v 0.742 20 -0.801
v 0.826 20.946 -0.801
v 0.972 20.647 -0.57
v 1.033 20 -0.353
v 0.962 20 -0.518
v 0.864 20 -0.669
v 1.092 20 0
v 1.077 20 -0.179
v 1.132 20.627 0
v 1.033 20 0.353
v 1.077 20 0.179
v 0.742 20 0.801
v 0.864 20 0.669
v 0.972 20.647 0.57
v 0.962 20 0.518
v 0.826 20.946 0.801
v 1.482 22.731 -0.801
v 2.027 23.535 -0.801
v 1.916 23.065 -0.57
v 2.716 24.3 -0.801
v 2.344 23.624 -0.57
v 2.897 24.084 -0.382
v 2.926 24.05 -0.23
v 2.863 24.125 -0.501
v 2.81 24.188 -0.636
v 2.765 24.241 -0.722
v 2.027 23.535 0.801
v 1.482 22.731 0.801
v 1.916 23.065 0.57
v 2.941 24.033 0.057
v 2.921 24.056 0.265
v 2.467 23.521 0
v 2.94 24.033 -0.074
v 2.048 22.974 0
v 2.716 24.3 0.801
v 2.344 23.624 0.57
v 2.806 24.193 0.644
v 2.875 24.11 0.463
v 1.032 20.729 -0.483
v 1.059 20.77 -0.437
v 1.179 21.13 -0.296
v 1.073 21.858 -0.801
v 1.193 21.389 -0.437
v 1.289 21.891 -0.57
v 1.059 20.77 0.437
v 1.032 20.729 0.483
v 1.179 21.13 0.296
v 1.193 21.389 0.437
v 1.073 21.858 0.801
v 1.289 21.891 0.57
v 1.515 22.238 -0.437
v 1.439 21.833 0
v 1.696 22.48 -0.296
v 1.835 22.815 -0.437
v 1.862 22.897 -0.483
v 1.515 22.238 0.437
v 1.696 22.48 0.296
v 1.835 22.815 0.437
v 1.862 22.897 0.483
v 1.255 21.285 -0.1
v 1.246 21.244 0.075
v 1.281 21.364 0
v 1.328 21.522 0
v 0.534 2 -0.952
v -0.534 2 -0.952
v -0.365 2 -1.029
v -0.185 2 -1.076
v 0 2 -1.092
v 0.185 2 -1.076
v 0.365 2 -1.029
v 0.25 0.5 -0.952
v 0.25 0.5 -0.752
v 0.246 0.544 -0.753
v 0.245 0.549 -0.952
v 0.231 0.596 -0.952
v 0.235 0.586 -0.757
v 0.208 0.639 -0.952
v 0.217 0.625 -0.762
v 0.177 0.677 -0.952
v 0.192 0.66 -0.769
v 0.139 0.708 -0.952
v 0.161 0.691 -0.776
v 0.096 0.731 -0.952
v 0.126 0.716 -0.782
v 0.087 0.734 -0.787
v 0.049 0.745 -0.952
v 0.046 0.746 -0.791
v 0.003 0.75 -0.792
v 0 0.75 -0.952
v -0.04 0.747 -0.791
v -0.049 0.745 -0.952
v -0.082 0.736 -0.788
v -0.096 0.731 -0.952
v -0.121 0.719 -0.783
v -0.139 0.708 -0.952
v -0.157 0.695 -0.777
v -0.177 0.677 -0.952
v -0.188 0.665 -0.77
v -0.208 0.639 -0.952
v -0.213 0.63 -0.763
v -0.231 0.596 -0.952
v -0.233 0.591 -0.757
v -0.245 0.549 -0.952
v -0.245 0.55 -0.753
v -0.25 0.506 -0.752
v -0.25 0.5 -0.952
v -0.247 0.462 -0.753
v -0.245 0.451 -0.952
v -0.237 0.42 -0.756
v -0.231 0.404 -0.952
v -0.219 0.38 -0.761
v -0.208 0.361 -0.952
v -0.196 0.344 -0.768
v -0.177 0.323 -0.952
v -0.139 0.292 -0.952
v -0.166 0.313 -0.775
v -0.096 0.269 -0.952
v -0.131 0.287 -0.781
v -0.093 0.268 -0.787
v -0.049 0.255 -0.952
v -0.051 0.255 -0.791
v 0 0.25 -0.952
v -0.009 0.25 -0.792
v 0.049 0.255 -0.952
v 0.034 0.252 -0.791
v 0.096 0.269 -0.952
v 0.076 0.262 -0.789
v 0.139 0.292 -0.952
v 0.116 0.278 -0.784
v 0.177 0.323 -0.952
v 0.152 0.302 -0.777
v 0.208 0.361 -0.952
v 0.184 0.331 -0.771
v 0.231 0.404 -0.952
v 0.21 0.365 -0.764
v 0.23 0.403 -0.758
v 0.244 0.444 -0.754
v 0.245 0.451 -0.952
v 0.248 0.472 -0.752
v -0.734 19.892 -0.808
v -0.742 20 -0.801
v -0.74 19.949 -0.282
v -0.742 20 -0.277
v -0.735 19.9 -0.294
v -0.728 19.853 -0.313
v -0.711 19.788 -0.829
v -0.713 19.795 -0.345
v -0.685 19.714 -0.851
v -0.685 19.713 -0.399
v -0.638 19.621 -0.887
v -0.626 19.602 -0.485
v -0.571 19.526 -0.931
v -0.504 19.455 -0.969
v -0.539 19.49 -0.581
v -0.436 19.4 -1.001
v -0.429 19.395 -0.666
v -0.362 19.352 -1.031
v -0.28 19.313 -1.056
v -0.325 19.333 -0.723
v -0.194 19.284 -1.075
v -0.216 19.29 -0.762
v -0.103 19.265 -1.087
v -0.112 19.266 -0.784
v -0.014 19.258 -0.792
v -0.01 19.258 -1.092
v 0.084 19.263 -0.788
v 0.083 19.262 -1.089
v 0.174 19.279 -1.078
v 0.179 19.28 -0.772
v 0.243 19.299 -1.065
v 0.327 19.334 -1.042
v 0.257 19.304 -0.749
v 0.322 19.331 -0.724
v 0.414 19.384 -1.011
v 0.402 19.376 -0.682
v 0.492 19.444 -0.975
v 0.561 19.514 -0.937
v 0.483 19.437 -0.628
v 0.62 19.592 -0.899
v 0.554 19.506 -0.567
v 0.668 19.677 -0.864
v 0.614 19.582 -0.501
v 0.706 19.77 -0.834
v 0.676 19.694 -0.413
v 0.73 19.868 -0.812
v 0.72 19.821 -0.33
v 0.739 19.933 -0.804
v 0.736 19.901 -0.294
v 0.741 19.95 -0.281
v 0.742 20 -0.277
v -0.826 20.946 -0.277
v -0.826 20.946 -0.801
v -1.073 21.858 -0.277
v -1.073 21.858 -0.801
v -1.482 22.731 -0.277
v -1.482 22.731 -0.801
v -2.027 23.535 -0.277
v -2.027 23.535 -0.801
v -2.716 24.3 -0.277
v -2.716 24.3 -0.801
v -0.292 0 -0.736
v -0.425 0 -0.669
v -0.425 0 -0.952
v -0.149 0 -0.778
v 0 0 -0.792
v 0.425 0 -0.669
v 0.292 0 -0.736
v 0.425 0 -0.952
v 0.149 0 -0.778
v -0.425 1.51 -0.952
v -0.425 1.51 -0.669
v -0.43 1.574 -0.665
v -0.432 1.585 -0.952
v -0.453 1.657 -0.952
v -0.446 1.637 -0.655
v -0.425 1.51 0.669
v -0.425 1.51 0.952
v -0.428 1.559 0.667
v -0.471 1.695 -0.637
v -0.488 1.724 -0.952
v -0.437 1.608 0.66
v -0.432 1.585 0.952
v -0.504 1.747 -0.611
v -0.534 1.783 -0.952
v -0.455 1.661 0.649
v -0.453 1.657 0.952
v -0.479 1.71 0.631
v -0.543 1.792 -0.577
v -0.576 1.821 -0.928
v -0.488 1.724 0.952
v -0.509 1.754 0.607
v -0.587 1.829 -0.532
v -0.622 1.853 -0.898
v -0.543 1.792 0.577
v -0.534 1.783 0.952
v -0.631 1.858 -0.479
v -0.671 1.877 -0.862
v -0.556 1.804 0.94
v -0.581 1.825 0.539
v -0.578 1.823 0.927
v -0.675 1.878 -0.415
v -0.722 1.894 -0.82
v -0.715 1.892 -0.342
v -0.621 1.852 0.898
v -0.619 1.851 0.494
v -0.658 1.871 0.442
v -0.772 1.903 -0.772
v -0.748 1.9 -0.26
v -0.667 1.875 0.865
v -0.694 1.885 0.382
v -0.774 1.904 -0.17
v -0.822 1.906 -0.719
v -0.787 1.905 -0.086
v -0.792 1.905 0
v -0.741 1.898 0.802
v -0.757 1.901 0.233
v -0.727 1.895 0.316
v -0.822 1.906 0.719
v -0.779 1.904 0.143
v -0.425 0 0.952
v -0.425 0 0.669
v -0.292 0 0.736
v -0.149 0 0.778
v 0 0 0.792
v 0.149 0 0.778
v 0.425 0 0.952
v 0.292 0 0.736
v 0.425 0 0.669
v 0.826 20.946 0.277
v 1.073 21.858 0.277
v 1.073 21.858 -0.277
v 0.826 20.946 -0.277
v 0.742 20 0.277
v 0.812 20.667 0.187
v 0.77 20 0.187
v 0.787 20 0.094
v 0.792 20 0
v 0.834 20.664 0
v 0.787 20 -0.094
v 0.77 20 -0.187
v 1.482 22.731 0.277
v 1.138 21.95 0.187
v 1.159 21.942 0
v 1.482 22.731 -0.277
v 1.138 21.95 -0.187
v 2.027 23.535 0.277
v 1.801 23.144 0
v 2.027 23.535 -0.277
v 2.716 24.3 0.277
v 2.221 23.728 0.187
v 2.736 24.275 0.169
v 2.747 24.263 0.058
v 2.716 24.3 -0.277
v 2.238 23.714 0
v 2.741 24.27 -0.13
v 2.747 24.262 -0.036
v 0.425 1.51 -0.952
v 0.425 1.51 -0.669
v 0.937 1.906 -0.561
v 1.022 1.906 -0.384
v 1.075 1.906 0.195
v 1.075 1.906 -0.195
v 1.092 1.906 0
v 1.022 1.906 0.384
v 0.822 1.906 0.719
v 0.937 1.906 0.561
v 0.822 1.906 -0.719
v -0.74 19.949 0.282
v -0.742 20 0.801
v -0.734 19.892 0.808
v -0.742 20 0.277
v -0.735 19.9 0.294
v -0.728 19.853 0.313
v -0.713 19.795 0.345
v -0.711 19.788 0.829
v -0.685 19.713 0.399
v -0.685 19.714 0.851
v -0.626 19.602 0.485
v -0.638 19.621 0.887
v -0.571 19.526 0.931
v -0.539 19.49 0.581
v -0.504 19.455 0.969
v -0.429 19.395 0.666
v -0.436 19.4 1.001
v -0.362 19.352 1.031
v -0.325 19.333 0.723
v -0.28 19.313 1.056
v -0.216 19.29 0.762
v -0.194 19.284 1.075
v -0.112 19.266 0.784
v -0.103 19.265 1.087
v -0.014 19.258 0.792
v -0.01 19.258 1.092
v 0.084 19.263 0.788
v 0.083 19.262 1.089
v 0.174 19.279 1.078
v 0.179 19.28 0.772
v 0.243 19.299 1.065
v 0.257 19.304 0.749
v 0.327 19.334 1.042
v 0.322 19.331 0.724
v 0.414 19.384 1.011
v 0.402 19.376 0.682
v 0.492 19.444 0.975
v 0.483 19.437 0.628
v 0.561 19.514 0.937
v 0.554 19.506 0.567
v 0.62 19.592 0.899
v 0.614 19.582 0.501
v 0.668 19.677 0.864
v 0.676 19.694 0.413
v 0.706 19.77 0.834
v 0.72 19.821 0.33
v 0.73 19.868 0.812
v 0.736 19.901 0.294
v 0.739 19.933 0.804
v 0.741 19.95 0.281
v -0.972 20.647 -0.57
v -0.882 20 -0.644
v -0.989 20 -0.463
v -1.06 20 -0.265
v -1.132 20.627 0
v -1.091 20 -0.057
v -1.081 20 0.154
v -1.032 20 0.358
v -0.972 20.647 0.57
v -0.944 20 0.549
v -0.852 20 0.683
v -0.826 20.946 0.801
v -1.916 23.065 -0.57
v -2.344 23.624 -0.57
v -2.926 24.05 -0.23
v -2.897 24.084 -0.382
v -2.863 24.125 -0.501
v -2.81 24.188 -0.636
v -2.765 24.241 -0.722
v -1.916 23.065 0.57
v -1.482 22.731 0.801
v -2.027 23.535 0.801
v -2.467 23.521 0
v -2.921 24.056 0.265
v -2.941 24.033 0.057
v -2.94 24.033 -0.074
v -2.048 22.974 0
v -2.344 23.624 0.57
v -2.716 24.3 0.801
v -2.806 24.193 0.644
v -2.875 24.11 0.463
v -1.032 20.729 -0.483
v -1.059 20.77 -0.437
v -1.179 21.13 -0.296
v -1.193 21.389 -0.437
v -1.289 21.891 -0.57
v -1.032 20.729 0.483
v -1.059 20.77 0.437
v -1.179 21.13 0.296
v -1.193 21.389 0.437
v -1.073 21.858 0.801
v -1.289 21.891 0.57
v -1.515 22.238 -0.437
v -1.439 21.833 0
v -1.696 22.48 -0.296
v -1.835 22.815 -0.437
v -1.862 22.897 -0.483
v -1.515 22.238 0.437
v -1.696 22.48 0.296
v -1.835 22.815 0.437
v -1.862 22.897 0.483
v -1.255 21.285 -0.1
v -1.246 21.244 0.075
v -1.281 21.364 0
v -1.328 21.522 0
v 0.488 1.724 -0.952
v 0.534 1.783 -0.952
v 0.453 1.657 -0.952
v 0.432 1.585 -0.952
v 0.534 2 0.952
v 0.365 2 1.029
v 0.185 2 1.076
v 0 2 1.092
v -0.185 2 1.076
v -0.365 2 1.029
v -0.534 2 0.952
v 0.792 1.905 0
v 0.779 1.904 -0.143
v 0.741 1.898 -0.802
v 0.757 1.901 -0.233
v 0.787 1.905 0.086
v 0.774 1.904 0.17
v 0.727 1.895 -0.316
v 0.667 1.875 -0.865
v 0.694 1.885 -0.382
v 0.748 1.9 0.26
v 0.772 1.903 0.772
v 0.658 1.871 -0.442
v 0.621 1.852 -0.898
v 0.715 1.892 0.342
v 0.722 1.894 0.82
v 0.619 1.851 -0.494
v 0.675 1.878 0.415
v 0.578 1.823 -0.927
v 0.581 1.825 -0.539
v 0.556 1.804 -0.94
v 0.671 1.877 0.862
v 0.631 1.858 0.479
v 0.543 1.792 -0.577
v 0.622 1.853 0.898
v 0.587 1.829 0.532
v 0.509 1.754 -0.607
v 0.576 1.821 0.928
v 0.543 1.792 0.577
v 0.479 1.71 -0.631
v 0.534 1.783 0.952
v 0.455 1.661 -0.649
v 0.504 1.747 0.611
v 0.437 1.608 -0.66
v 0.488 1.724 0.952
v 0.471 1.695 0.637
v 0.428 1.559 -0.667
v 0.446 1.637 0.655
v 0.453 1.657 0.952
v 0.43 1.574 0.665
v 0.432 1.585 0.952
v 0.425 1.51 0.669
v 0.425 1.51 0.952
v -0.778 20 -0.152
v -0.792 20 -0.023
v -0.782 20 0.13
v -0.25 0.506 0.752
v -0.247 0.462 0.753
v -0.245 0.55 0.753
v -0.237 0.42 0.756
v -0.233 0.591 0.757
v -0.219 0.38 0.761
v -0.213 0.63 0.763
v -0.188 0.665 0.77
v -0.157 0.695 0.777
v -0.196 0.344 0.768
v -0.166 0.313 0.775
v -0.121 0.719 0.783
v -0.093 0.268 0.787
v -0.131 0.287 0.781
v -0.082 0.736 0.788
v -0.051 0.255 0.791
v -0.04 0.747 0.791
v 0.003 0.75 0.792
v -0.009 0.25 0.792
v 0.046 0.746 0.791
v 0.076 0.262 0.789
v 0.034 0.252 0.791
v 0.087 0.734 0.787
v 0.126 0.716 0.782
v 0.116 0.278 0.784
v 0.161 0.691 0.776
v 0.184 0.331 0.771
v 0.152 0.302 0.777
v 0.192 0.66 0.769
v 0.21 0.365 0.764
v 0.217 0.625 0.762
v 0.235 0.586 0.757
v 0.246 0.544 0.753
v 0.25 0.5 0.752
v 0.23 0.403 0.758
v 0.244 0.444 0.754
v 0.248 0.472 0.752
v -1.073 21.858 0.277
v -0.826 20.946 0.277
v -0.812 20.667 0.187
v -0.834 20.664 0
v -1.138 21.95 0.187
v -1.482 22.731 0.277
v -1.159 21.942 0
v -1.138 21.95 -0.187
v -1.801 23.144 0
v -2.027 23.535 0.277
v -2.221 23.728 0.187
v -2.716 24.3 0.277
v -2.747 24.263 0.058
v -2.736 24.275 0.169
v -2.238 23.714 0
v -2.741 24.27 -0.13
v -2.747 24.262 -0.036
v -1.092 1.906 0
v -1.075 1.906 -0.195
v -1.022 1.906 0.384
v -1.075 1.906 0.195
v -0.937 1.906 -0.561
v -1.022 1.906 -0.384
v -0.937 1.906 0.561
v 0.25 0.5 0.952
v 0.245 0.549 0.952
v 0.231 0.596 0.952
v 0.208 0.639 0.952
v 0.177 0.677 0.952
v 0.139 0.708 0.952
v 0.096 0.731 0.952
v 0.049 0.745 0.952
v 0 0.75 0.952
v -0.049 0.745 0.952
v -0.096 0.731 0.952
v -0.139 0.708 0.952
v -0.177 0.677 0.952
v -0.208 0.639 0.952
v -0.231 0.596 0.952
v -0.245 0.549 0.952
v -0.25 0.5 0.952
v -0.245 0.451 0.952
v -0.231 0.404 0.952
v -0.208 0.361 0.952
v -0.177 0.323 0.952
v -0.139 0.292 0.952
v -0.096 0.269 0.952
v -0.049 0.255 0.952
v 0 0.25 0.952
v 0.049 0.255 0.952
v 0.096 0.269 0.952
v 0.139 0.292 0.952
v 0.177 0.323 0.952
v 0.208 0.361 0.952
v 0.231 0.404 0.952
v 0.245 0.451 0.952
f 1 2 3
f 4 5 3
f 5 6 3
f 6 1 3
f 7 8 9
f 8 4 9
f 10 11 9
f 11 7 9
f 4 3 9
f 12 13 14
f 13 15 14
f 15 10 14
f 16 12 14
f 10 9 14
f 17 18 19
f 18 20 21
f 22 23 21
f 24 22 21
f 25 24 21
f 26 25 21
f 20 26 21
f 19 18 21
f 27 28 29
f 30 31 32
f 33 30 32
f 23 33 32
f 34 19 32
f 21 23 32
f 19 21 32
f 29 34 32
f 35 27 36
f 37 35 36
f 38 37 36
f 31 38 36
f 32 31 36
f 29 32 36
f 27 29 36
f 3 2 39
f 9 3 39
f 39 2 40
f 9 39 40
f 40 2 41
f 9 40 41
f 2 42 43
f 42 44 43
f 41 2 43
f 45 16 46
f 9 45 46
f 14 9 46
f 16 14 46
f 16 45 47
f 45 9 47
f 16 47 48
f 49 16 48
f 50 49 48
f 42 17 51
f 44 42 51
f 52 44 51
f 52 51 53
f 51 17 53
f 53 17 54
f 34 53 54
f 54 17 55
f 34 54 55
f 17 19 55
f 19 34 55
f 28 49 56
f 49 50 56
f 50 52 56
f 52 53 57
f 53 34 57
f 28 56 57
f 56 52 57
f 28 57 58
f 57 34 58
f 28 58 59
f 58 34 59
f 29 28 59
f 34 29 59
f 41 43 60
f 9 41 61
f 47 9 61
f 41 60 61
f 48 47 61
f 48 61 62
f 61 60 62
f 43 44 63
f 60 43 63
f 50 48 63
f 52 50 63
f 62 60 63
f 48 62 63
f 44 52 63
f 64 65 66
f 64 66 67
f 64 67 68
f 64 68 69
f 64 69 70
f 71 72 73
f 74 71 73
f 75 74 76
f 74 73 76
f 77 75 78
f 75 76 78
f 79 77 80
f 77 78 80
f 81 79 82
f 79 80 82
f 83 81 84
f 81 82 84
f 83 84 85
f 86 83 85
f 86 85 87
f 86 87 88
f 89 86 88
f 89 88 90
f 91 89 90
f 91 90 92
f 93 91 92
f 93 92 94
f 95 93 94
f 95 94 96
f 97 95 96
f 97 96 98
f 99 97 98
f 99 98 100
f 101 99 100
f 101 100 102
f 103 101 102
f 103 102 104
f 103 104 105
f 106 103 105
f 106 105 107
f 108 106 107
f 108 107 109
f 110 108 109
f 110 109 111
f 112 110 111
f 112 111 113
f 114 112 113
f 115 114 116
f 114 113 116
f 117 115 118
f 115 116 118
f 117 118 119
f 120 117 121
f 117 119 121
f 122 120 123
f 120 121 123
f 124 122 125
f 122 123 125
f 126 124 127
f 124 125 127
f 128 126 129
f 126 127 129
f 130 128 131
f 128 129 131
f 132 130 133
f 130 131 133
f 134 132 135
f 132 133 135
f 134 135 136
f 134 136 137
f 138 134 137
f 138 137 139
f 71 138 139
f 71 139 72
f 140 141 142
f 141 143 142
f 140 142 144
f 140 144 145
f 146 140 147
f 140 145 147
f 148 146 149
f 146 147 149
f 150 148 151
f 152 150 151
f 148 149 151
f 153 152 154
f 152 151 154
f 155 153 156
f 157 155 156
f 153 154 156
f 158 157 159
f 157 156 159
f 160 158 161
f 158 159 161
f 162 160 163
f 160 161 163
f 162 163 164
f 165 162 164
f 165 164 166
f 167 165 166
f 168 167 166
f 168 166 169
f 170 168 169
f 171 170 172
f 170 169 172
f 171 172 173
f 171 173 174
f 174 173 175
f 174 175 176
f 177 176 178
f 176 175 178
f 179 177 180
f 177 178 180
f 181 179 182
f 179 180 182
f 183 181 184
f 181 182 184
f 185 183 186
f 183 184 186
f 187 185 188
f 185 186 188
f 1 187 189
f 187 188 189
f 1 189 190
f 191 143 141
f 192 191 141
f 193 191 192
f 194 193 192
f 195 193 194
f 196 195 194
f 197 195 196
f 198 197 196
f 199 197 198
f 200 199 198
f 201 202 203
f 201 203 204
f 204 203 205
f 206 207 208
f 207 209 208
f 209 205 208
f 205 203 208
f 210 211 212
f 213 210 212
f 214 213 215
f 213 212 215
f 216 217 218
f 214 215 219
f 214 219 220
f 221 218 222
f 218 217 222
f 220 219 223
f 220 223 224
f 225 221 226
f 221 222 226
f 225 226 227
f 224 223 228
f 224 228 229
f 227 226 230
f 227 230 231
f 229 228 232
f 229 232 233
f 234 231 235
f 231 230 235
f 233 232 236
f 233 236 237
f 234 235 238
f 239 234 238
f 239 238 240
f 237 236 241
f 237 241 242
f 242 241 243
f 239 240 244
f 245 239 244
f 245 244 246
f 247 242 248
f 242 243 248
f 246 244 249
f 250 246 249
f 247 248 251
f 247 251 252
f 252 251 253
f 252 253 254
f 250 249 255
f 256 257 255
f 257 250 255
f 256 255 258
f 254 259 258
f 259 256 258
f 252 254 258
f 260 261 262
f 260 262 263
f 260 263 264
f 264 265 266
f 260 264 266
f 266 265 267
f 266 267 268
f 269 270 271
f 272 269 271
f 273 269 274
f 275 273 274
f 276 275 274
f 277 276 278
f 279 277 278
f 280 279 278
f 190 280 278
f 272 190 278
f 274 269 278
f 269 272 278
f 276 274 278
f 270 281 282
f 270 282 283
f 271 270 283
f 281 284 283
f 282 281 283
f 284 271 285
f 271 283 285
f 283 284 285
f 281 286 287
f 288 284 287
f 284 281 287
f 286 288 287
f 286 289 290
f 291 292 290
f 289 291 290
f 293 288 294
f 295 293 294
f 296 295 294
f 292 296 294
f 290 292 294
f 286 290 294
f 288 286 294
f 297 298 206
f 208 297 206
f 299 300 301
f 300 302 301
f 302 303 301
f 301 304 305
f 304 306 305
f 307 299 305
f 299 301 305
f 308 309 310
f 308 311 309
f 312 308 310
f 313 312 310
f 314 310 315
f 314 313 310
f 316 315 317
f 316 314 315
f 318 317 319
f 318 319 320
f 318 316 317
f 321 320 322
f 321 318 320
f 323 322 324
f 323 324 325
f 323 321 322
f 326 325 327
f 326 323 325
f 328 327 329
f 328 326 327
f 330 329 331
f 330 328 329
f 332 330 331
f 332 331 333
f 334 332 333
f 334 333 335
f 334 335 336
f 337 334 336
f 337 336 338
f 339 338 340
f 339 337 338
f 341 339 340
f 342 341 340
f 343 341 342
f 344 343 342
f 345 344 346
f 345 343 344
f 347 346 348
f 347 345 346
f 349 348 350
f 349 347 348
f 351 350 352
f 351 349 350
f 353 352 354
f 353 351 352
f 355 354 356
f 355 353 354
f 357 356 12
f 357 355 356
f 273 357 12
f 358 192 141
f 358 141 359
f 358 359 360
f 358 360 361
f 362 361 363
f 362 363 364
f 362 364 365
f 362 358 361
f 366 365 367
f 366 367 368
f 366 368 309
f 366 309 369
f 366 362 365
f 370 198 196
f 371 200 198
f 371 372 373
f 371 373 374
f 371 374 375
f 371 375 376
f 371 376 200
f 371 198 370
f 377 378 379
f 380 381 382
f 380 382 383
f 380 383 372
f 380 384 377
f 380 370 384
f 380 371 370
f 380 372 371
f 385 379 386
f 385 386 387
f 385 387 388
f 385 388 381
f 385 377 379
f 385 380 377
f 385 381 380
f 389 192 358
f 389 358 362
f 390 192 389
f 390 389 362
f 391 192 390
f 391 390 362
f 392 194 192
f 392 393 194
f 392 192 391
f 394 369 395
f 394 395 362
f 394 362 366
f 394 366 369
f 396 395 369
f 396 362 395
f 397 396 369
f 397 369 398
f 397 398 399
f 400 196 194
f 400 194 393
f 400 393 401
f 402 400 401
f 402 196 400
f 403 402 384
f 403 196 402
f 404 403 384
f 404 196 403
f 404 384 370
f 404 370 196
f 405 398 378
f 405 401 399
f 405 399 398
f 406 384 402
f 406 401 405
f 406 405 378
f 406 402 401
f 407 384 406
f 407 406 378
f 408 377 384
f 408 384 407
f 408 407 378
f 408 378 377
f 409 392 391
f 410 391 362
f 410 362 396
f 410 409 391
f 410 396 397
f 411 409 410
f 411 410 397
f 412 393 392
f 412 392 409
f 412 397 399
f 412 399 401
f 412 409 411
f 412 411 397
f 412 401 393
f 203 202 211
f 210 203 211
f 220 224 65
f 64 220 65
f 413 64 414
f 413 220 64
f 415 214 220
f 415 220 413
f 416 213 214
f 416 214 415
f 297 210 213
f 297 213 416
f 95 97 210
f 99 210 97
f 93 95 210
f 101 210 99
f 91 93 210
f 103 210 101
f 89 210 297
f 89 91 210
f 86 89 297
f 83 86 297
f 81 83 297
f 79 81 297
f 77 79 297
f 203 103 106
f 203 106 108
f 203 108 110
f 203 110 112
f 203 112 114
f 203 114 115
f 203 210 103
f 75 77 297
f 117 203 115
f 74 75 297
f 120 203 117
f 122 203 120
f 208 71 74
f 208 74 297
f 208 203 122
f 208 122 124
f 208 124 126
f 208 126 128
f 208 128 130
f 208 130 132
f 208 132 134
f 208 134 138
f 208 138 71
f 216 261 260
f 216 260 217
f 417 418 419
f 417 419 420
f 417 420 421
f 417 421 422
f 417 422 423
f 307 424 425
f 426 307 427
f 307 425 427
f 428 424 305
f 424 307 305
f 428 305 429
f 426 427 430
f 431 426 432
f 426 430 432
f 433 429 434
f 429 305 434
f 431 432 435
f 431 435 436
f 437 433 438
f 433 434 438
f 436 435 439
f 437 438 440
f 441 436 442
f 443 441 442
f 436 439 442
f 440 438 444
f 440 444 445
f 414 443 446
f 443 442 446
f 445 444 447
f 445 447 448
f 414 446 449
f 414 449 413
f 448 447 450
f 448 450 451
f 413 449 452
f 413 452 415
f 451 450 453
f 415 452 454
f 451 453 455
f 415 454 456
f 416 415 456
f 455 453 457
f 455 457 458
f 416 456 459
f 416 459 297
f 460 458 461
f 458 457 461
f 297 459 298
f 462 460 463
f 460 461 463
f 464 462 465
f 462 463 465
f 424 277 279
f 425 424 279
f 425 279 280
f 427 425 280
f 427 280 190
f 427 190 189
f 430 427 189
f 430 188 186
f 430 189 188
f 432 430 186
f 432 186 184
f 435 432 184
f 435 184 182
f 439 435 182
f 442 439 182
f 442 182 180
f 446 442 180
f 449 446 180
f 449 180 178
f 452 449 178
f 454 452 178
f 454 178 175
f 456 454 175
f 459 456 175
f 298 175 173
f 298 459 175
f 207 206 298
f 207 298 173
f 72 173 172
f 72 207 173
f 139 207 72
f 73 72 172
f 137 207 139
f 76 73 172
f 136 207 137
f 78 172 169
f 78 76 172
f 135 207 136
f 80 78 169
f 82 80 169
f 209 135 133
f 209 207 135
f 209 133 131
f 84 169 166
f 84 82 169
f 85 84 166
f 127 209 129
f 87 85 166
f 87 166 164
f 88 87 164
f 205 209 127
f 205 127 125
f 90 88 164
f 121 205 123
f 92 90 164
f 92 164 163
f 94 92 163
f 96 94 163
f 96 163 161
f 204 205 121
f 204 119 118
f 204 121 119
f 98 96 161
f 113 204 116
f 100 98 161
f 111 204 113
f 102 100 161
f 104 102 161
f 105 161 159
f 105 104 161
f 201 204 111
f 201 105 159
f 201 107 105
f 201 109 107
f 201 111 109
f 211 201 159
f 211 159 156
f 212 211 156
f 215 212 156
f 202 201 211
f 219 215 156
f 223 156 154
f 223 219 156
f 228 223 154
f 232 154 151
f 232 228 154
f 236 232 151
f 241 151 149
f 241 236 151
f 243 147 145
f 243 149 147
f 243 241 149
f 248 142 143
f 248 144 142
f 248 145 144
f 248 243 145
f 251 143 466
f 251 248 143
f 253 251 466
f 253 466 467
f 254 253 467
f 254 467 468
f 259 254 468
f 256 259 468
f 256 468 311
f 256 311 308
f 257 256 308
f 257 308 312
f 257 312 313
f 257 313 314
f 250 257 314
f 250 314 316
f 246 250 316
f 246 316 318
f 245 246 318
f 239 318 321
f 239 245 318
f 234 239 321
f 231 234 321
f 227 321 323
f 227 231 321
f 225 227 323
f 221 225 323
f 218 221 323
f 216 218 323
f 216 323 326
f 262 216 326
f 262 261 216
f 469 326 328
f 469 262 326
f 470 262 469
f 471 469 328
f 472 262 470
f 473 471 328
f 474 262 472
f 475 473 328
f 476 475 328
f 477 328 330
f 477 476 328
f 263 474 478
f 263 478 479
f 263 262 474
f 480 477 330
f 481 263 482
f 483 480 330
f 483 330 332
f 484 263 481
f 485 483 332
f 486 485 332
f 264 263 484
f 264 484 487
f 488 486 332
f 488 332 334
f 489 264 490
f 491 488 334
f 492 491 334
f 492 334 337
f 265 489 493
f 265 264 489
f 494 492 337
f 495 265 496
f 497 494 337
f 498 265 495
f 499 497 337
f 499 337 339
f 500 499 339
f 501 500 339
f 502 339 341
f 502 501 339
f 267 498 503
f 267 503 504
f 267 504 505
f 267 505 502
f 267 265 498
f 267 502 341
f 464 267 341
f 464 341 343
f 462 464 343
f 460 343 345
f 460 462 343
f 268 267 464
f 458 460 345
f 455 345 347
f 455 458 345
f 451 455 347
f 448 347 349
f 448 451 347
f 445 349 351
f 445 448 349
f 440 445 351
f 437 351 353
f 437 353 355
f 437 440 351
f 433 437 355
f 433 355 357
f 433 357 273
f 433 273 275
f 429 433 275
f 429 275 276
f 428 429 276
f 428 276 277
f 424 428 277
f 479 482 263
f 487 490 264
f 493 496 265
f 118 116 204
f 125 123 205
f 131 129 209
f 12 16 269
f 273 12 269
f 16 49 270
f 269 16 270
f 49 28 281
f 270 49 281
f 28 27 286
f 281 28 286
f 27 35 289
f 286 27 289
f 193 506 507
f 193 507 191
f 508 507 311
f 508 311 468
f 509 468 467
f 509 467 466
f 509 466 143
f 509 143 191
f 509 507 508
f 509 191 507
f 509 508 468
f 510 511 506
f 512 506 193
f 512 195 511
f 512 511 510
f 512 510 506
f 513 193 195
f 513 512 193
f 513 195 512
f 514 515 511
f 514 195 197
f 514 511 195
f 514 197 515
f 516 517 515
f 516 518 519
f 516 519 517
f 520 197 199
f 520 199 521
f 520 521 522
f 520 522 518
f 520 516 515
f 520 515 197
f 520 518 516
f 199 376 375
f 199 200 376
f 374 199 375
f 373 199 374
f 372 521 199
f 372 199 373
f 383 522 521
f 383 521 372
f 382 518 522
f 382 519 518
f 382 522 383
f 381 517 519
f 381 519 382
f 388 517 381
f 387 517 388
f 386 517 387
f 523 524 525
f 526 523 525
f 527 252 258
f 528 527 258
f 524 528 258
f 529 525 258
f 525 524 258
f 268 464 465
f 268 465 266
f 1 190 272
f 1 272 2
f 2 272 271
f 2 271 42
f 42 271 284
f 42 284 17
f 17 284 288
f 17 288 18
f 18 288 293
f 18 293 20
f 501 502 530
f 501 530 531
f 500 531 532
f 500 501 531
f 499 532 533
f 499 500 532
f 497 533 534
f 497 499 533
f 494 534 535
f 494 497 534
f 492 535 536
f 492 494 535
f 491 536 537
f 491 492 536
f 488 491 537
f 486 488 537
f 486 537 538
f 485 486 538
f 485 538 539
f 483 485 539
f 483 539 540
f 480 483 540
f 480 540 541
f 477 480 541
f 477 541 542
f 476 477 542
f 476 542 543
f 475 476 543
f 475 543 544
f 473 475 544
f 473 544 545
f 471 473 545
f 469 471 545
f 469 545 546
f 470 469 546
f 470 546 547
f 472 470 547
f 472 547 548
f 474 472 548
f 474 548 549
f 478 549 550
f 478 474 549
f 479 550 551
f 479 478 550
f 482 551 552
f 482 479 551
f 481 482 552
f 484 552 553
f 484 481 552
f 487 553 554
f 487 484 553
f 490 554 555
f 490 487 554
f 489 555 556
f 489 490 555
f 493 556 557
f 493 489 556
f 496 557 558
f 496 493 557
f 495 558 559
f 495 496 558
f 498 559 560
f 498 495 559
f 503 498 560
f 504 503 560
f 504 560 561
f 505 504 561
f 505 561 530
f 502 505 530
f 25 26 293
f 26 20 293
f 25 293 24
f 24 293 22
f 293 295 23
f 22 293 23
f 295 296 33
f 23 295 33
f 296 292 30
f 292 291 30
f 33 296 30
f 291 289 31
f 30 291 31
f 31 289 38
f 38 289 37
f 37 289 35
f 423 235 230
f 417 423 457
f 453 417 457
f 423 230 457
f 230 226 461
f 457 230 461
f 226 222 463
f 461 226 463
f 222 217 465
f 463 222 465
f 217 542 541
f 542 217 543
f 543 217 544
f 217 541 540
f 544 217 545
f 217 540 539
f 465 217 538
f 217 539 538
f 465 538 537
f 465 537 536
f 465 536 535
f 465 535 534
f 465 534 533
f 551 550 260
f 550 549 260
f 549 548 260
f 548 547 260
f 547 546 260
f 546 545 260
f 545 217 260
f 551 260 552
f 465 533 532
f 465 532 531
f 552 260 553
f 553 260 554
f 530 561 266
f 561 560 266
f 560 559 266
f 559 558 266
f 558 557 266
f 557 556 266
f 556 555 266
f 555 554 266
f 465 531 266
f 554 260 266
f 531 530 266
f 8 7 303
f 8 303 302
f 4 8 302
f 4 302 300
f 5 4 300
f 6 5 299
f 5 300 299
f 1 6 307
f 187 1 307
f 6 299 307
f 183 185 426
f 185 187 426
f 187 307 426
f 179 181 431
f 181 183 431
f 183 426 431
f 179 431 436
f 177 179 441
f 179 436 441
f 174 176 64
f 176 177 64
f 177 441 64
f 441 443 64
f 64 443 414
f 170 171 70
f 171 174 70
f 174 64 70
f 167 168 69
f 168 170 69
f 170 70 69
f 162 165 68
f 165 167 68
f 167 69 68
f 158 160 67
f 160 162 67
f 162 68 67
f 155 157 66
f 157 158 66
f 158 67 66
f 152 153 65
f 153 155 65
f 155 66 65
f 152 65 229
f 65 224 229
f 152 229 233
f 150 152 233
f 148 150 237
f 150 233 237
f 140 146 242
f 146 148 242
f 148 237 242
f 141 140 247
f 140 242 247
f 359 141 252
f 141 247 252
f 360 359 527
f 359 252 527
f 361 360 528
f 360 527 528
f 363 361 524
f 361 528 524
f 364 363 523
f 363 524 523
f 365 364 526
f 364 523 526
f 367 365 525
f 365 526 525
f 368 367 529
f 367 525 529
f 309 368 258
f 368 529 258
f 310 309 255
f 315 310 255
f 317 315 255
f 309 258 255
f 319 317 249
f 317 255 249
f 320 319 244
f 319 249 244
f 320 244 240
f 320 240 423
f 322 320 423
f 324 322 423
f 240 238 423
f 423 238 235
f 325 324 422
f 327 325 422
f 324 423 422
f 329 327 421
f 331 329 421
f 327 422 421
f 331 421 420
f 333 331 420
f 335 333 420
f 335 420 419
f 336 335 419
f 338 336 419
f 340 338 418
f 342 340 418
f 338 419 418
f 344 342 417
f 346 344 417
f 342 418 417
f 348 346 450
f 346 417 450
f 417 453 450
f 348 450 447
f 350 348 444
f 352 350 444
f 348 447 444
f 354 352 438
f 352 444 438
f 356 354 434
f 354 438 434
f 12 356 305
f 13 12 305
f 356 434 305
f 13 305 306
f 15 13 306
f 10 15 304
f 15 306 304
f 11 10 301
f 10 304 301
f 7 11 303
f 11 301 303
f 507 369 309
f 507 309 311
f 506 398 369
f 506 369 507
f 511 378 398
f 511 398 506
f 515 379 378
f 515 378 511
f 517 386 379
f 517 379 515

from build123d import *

# Parameters (mm, degrees)
SKETCH1_R                = 1.0922
SKETCH1_R_2              = 0.7922
EXTRUDE_THIN1_DEPTH      = 20
CUT_EXTRUDE1_DEPTH       = 26.634625129
CUT_EXTRUDE1_DEPTH_BACK  = 26.634625129
SKETCH5_R                = 0.7422
CUT_EXTRUDE3_DEPTH       = 1
SKETCH10_W               = 7.629631572
SKETCH10_H               = 1.4248156
SKETCH10_H_2             = 1.107527322
CUT_EXTRUDE5_DEPTH       = 2
CUT_EXTRUDE4_DEPTH       = 10
CUT_EXTRUDE4_DEPTH_BACK  = 10
SKETCH9_R                = 0.25
CUT_EXTRUDE10_DEPTH      = 1.5
CUT_EXTRUDE10_DEPTH_BACK = 1.5


with BuildPart() as part:
    # Sketch1 → Extrude-Thin1 (new body)
    with BuildSketch(Plane(origin=(0, 0, 0), x_dir=(1, 0, 0), z_dir=(0, 1, 0))):
        Circle(SKETCH1_R)
        Circle(SKETCH1_R_2, mode=Mode.SUBTRACT)
    extrude(amount=EXTRUDE_THIN1_DEPTH)

    # Sweep1: sweep along a path in Sketch4
    with BuildLine() as sweep1_path:  # in the path sketch's own coordinates; laid on its plane below (add() does not lay a ready-made edge on the line's plane)
        add(Edge.make_bspline(
            [(-1.0922, 20), (-1.1, 22.819845093), (-4.0922, 25)],
            knots=[0, 0, 0, 1, 1, 1], degree=2))
    # Sketch3 → Sweep1 (sweep)
    with BuildSketch(Plane(origin=(0, 20, 0), x_dir=(1, 0, 0), z_dir=(0, 1, 0))):
        with BuildLine():
            Line((-0.7422, -0.276983754), (-0.7422, -0.801273986))
            ThreePointArc((-0.7422, -0.801273986), (-1.0922, 0), (-0.7422, 0.801273986))
            Line((-0.7422, 0.801273986), (-0.7422, 0.276983754))
            ThreePointArc((-0.7422, 0.276983754), (-0.7922, 0), (-0.7422, -0.276983754))
        make_face()
    sweep1 = sweep(path=Plane.XY * sweep1_path.line)

    # Mirror1: Sweep1 across plane
    add(sweep1.mirror(Plane(origin=(0, 0, 0), x_dir=(0, 0, 1), z_dir=(1, 0, 0))))

    # Sketch5 → Cut-Extrude1 (cut, two sides: drawn at the far end of the back side and taken through both)
    with BuildSketch(Plane.XY.offset(-CUT_EXTRUDE1_DEPTH_BACK)):
        with Locations((0, 20)):
            Circle(SKETCH5_R)
    extrude(amount=CUT_EXTRUDE1_DEPTH + CUT_EXTRUDE1_DEPTH_BACK, mode=Mode.SUBTRACT)

    # Sketch7 → Cut-Extrude3 (cut, symmetric)
    with BuildSketch(Plane.XY):
        Polygon((-3.943727123, 25.376725106), (-2.695468515, 24.323621974), (-3.002892381, 23.959227952), (-4.233358336, 24.997320174), align=None)
    cut_extrude3 = extrude(amount=CUT_EXTRUDE3_DEPTH, both=True, mode=Mode.SUBTRACT)

    # Mirror2: Cut-Extrude3 across plane
    add(cut_extrude3.mirror(Plane(origin=(0, 0, 0), x_dir=(0, 0, 1), z_dir=(1, 0, 0))), mode=Mode.SUBTRACT)

    # Sketch10 → Cut-Extrude5 (cut)
    with BuildSketch(Plane.XZ):
        with Locations((0.215570245, 1.6649078)):
            Rectangle(SKETCH10_W, SKETCH10_H)
        with Locations((0.215570245, -1.506263661)):
            Rectangle(SKETCH10_W, SKETCH10_H_2)
    extrude(amount=-CUT_EXTRUDE5_DEPTH, mode=Mode.SUBTRACT)

    # Sketch9 → Cut-Extrude4 (cut, two sides: drawn at the far end of the back side and taken through both)
    with BuildSketch(Plane.XY.offset(-CUT_EXTRUDE4_DEPTH_BACK)):
        with Locations((0, 0.5)):
            Circle(SKETCH9_R)
    extrude(amount=CUT_EXTRUDE4_DEPTH + CUT_EXTRUDE4_DEPTH_BACK, mode=Mode.SUBTRACT)

    # Sketch11 → Cut-Extrude10 (cut, two sides: drawn at the far end of the back side and taken through both)
    with BuildSketch(Plane.XY.offset(-CUT_EXTRUDE10_DEPTH_BACK)):
        with BuildLine():
            Line((0.425, 1.509625), (0.425, 0))
            Line((0.425, 0), (0.425, -2.073284984))
            Line((0.425, -2.073284984), (3.393193603, 1.9065))
            Line((3.393193603, 1.9065), (0.821875, 1.9065))
            ThreePointArc((0.821875, 1.9065), (0.541241996, 1.790258004), (0.425, 1.509625))
        make_face()
        with BuildLine():
            Line((-0.821875, 1.9065), (-3.393193603, 1.9065))
            Line((-3.393193603, 1.9065), (-0.425, -3.083793411))
            Line((-0.425, -3.083793411), (-0.425, 0))
            Line((-0.425, 0), (-0.425, 1.509625))
            ThreePointArc((-0.425, 1.509625), (-0.541241996, 1.790258004), (-0.821875, 1.9065))
        make_face()
    extrude(amount=CUT_EXTRUDE10_DEPTH + CUT_EXTRUDE10_DEPTH_BACK, mode=Mode.SUBTRACT)


solid = part.part
